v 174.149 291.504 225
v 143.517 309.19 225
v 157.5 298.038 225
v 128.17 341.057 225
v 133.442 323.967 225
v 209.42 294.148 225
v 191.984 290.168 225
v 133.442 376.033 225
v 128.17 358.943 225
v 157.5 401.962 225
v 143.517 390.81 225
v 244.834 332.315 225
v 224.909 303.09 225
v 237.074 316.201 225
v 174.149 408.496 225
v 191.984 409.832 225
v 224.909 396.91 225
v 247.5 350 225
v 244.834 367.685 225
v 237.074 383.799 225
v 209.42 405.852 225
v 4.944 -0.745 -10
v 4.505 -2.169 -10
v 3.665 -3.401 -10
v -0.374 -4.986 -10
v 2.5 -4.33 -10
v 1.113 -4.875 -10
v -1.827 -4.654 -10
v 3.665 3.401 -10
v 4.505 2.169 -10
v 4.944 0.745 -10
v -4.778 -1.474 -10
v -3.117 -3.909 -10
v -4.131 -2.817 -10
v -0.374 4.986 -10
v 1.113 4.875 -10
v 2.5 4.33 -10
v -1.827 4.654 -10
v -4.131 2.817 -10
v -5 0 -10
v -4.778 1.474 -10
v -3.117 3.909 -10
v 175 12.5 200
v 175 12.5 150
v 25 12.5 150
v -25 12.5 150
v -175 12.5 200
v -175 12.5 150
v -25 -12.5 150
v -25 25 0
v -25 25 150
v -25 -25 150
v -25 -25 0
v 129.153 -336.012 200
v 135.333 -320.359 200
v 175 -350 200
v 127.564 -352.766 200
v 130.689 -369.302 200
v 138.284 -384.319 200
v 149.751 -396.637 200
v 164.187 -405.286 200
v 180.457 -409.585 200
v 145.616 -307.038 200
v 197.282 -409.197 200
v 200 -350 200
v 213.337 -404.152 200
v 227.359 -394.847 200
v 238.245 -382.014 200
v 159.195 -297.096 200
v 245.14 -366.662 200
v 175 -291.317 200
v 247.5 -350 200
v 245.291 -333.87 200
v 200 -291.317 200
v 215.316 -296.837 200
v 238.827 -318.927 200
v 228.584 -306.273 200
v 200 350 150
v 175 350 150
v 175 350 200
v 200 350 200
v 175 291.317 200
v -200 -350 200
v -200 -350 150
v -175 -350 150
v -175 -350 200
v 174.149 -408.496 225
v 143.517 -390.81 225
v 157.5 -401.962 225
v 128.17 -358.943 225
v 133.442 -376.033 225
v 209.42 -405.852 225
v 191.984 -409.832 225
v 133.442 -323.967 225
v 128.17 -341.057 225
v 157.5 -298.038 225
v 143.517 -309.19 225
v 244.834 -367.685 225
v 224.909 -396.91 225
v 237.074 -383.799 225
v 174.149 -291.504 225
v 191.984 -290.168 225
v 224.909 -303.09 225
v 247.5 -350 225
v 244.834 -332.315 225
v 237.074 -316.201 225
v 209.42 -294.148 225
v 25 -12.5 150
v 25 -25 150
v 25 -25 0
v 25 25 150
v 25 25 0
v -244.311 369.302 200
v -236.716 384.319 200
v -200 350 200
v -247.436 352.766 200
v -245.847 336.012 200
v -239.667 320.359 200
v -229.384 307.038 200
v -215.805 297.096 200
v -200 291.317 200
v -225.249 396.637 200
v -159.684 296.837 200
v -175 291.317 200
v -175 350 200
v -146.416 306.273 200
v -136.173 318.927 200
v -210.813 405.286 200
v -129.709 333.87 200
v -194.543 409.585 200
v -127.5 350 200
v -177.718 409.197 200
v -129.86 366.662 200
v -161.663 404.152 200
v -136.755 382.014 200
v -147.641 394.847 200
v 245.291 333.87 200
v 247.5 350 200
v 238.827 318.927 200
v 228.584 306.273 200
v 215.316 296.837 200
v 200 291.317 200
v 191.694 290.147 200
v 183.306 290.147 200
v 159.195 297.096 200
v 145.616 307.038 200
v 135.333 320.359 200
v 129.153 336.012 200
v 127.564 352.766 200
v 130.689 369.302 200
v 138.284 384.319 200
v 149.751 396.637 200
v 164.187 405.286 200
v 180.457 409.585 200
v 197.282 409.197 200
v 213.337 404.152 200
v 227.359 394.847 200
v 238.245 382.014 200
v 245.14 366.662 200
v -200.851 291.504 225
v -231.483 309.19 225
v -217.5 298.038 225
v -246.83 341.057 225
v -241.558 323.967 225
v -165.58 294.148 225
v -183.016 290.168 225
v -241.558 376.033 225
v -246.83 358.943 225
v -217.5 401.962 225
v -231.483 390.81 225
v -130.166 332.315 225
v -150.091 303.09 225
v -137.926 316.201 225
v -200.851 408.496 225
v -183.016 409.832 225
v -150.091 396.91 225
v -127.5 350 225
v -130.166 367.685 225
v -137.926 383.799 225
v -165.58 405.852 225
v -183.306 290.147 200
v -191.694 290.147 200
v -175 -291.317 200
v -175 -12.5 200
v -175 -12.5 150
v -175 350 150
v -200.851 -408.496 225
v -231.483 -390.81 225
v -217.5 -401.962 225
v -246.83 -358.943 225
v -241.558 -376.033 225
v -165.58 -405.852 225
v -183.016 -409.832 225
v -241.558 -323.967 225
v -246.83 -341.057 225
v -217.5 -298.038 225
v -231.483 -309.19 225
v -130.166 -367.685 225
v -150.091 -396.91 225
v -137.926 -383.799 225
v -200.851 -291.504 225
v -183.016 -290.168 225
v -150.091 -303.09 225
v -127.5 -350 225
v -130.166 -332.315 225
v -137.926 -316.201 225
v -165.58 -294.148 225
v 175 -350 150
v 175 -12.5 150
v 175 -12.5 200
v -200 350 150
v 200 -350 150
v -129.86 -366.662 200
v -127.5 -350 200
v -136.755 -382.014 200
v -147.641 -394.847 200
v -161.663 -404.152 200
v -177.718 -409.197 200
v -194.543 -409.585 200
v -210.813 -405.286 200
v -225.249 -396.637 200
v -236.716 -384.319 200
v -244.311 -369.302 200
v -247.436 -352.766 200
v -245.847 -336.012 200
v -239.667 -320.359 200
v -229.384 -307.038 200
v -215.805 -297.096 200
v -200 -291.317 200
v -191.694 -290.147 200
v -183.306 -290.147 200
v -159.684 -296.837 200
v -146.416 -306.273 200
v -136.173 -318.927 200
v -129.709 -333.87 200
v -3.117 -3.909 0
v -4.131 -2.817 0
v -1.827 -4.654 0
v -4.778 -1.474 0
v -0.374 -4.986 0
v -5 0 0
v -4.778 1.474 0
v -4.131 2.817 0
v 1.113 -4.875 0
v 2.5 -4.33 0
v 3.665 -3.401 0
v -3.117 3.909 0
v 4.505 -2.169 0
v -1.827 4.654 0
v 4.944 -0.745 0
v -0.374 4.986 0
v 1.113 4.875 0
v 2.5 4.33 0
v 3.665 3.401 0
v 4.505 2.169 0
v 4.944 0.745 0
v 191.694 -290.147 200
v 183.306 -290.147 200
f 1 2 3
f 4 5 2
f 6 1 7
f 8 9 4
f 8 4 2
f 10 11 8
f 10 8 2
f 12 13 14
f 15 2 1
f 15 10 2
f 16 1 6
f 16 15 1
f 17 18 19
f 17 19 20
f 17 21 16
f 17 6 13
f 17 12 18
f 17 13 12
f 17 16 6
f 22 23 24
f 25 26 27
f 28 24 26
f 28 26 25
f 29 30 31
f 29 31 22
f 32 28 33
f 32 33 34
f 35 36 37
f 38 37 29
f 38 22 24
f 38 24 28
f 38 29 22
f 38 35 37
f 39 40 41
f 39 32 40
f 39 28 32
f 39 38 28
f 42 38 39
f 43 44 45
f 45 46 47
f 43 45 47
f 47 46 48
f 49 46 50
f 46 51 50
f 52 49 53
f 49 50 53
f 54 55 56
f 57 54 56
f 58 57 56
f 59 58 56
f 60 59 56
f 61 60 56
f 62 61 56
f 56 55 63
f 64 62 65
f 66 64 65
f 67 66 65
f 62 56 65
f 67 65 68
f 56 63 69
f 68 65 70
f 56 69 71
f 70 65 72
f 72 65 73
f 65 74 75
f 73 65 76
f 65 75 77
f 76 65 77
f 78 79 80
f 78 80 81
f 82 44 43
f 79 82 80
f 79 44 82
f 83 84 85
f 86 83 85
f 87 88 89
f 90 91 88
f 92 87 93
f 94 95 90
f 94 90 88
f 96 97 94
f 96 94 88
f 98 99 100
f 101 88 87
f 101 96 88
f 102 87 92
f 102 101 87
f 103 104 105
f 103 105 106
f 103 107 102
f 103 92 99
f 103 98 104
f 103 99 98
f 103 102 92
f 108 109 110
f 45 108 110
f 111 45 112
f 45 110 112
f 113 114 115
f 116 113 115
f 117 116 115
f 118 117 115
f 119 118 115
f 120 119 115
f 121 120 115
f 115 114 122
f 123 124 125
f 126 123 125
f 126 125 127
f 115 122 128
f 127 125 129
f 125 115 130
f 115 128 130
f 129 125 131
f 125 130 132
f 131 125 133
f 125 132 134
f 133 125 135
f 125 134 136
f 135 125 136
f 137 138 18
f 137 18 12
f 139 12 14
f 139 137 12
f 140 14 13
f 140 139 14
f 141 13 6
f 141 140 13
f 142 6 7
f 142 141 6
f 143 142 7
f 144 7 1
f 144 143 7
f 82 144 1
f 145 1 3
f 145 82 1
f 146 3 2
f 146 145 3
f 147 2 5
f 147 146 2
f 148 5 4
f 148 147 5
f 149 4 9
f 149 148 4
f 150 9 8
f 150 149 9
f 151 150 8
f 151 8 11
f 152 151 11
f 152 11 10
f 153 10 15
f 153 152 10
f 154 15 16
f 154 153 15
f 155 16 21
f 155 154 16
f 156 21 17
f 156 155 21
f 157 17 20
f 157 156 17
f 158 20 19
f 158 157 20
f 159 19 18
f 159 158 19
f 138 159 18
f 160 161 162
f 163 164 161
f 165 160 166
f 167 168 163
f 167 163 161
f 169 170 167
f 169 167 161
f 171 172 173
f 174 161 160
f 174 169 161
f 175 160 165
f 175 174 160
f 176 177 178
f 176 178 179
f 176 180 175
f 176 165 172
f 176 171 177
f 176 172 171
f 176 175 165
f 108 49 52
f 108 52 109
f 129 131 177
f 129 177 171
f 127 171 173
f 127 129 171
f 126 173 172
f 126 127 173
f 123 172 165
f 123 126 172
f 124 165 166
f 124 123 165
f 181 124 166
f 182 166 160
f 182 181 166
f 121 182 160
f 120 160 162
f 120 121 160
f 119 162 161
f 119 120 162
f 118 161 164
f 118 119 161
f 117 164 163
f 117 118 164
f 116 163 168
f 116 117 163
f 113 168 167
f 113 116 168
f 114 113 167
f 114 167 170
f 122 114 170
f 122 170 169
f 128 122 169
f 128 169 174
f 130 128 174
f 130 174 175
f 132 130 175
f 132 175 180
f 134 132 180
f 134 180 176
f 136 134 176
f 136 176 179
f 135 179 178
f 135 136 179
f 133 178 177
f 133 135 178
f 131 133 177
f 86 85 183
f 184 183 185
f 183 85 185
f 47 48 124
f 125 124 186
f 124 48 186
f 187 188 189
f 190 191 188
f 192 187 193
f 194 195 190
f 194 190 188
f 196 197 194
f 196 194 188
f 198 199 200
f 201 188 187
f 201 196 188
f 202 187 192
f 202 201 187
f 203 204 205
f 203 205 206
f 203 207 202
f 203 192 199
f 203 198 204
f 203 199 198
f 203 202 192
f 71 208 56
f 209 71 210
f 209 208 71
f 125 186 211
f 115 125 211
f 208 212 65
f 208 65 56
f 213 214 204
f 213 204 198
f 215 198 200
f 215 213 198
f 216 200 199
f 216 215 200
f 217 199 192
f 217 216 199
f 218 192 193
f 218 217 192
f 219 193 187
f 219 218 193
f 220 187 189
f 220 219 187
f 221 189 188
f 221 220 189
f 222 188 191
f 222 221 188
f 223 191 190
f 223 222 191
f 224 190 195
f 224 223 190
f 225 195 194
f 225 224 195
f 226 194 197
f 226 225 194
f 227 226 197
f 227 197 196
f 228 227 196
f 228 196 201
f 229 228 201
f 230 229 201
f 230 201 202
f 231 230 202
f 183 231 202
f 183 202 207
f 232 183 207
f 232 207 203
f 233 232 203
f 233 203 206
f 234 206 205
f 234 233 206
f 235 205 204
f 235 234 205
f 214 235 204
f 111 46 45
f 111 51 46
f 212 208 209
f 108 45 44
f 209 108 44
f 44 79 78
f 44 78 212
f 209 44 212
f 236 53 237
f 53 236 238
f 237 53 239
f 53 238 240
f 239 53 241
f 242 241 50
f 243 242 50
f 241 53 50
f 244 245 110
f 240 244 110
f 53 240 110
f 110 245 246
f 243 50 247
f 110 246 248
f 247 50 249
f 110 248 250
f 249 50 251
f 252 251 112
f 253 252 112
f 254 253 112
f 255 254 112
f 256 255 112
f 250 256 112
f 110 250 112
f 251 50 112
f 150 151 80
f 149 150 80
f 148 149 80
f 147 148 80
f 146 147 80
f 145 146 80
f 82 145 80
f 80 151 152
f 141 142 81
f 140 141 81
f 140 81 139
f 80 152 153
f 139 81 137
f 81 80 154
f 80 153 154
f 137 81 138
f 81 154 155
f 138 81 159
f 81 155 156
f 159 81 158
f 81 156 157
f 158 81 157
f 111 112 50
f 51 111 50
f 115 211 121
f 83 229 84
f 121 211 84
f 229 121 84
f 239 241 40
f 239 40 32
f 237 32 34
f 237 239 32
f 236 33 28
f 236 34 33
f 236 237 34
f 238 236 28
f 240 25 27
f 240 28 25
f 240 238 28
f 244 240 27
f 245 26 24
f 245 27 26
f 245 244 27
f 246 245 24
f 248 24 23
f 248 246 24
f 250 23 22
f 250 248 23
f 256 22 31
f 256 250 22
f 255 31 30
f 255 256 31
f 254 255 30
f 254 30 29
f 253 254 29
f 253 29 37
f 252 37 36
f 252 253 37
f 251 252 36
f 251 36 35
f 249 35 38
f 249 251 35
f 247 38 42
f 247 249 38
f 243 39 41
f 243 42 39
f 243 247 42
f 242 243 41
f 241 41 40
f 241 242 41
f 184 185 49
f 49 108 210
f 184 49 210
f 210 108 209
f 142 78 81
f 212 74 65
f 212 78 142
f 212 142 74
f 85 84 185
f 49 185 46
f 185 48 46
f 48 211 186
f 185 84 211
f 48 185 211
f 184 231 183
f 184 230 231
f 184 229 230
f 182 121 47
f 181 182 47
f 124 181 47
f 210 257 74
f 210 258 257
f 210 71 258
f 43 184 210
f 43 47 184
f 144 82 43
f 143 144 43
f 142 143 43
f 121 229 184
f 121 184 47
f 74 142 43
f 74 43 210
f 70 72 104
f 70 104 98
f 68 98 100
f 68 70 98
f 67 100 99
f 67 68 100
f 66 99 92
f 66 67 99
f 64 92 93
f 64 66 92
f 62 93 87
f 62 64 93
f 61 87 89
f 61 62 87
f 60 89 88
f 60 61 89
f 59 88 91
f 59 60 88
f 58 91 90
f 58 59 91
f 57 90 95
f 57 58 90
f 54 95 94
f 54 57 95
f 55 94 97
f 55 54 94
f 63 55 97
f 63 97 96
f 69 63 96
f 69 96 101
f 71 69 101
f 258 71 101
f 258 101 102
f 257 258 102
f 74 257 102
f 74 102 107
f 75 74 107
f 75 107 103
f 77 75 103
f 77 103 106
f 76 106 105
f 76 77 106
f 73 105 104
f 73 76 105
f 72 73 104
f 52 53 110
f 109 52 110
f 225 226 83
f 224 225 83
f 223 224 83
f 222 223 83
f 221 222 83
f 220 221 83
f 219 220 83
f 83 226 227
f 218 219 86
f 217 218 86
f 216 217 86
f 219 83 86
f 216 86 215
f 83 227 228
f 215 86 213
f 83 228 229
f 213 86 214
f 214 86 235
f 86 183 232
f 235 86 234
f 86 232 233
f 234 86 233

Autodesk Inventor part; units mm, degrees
ref_plane "YZ Plane" through (0, 0, 0) normal (1, 0, 0) x (0, 1, 0)
ref_plane "XZ Plane" through (0, 0, 0) normal (0, 1, 0) x (-1, 0, 0)
ref_plane "XY Plane" through (0, 0, 0) normal (0, 0, 1) x (1, 0, 0)
sketch "Sketch1" plane through (0, 0, 0) normal (0, 0, 1) x (1, 0, 0)
  line L0 (-25, -25) -> (25, -25)
  line L1 (25, -25) -> (25, 25)
  line L2 (25, 25) -> (-25, 25)
  line L3 (-25, 25) -> (-25, -25)
  point P0 (0, 0)
  dimension "d0" = 50
  dimension "d1" = 50
  dimension "d2" = 25
  dimension "d3" = 25
extrude "Extrusion1" add sketch "Sketch1" along normal blind 150
sketch "Sketch2" plane through (0, 0, 0) normal (0, 0, -1) x (-1, 0, 0)
  circle A0 centre (0, 0) radius 5
  dimension "d6" = 10
extrude "Extrusion2" add sketch "Sketch2" along normal blind 10
sketch "Sketch3" plane through (0, 0, 150) normal (0, 0, 1) x (1, 0, 0)
  line L0 (-200, -12.5) -> (0, -12.5)
  line L1 (0, -12.5) -> (0, 12.5)
  line L2 (0, 12.5) -> (-200, 12.5)
  line L3 (-200, 12.5) -> (-200, -12.5)
  line L4 (-200, -350) -> (-175, -350)
  line L5 (-175, -350) -> (-175, 350)
  line L6 (-175, 350) -> (-200, 350)
  line L7 (-200, 350) -> (-200, -350)
  line L8 (200, -12.5) -> (0, -12.5)
  line L9 (0, 12.5) -> (200, 12.5)
  line L10 (200, 12.5) -> (200, -12.5)
  line L11 (200, -350) -> (175, -350)
  line L12 (175, -350) -> (175, 350)
  line L13 (175, 350) -> (200, 350)
  line L14 (200, 350) -> (200, -350)
  point P0 (0, 0)
  point P1 (0, 0)
  point P2 (-187.5, -350)
  point P3 (187.5, -350)
  point P4 (-175, -12.5)
  point P5 (175, -12.5)
  point P6 (175, 12.5)
  point P7 (-175, 12.5)
  dimension "d9" = 25
  dimension "d10" = 200
  dimension "d11" = 25
  dimension "d12" = 700
  dimension "d13" = 350
extrude "Extrusion3" add sketch "Sketch3" along normal blind 50
sketch "Sketch4" plane through (0, 0, 200) normal (0, 0, 1) x (1, 0, 0)
  line L0 (-200, -350) -> (-175, -350) projected
  circle A0 centre (-187.5, -350) radius 60
  line L1 (-187.5, -350) -> (-187.5, 371.532) construction
  line L2 (-187.5, -350) -> (187.5, -350) construction
  line L3 (175, -350) -> (200, -350) projected
  circle A1 centre (-187.5, 350) radius 60
  circle A2 centre (187.5, -350) radius 60
  circle A3 centre (187.5, 350) radius 60
  point P0 (0, 0)
  dimension "d16" = 120
  dimension "d19" = 700
  dimension "d22" = 375
extrude "Extrusion4" add sketch "Sketch4" along normal blind 25
equation "\"d0\" = d1"
equation "\"d2\" = 0.5 * d0"
equation "\"d3\" = d2"
equation "\"d13\" = 0.5 * d12"
properties part number "LINK 6"
